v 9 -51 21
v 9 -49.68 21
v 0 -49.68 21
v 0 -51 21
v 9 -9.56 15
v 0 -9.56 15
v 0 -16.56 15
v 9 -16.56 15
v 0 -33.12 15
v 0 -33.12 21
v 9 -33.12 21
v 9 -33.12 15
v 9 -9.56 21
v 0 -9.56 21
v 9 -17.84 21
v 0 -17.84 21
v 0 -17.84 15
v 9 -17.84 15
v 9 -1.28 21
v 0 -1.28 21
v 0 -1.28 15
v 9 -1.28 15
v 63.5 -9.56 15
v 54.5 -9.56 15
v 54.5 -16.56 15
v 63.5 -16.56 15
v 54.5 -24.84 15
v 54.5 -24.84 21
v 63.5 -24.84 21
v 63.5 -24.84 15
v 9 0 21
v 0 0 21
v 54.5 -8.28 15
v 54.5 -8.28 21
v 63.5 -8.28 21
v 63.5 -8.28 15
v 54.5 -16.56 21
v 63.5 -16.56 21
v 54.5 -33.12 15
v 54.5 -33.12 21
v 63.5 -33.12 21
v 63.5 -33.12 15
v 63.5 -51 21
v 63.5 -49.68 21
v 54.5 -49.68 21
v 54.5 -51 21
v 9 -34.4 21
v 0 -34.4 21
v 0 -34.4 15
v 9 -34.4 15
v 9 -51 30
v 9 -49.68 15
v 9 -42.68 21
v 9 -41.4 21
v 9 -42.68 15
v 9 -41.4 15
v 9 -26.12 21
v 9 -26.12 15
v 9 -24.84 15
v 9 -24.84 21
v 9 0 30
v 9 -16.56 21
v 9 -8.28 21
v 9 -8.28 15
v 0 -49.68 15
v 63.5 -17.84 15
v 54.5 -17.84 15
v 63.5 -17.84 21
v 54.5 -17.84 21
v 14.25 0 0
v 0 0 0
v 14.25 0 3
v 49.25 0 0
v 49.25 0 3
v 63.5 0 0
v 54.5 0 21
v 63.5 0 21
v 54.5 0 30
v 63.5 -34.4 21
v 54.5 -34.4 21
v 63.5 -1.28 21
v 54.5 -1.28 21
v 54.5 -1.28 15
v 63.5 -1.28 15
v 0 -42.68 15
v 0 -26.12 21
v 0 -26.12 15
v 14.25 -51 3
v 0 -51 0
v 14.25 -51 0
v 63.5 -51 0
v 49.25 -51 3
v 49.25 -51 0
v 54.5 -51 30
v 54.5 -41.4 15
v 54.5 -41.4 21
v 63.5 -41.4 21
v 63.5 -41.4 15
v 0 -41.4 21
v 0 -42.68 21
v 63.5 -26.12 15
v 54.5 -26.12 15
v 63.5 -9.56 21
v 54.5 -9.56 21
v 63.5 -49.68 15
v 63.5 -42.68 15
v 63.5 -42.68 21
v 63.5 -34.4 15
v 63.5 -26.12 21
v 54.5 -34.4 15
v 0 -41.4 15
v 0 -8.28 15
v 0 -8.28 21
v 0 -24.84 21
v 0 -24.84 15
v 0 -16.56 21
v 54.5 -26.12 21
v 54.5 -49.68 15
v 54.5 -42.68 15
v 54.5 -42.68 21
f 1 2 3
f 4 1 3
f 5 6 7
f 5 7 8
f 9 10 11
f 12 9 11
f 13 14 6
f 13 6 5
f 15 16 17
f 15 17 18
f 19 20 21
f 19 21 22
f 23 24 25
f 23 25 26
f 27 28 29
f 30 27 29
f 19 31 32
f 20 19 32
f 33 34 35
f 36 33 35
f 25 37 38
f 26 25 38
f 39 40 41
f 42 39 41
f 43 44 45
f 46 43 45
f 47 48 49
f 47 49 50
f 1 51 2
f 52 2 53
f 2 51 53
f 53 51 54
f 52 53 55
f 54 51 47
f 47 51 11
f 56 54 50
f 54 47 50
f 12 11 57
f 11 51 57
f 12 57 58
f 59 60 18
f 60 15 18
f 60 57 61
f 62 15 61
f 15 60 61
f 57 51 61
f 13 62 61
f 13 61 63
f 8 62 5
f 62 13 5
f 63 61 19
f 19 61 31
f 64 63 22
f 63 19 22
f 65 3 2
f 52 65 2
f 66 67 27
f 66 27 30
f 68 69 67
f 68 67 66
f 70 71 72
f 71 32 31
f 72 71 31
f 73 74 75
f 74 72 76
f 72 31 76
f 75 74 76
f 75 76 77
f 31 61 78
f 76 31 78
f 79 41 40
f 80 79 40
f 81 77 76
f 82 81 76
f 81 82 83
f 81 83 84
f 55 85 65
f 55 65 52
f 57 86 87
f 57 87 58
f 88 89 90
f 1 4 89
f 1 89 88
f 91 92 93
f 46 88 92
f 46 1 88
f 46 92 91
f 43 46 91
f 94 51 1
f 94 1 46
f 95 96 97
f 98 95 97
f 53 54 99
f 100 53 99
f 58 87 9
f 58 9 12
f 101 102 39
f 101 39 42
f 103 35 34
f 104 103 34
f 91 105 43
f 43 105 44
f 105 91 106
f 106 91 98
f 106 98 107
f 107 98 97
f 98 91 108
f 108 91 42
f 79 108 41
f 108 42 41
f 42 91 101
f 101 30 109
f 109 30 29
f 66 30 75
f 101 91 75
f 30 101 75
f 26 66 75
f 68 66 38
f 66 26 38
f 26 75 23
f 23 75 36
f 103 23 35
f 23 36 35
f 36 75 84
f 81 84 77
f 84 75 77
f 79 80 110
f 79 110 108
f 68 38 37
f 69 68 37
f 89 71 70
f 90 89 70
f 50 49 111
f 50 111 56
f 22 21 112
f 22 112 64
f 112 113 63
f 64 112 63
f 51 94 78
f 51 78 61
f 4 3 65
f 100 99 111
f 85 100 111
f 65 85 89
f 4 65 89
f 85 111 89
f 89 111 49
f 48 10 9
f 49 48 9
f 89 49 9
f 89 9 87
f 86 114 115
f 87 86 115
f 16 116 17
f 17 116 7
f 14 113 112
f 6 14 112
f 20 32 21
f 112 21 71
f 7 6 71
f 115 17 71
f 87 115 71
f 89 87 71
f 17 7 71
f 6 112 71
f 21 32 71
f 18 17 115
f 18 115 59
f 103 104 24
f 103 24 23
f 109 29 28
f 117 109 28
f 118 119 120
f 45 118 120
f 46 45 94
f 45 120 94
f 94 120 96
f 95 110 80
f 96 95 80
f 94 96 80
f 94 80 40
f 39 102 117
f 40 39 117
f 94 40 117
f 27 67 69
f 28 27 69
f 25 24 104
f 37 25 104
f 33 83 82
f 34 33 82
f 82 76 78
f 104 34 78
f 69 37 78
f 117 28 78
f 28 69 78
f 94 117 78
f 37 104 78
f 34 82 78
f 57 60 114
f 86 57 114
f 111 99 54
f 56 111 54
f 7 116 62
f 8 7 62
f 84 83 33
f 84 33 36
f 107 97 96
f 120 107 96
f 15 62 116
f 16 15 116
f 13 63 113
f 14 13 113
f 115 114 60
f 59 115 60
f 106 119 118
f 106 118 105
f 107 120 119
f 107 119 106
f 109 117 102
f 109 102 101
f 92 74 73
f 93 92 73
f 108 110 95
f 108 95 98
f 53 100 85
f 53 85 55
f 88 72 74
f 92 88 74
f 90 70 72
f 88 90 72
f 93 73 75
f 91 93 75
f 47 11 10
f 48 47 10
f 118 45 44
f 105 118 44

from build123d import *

# Parameters (mm, degrees)
F1_DEPTH = 51
F2_W     = 9
F2_H     = 7
F3_DEPTH = 6


with BuildPart() as f1:
    # F0 (on Front) → F1 (new body)
    with BuildSketch(Plane.XZ):
        Polygon((0, 21), (0, 0), (14.25, 0), (14.25, 3), (49.25, 3), (49.25, 0), (63.5, 0), (63.5, 21), (54.5, 21), (54.5, 30), (9, 30), (9, 21), align=None)
    extrude(amount=F1_DEPTH)

    # F2 (on face) → F3 (cut)
    with BuildSketch(Plane.XY.offset(21)):
        with Locations((59, -4.78)):
            Rectangle(F2_W, F2_H)
        with Locations((59, -13.06)):
            Rectangle(F2_W, F2_H)
        with Locations((59, -21.34)):
            Rectangle(F2_W, F2_H)
        with Locations((59, -29.62)):
            Rectangle(F2_W, F2_H)
        with Locations((59, -37.9)):
            Rectangle(F2_W, F2_H)
        with Locations((59, -46.18)):
            Rectangle(F2_W, F2_H)
        with Locations((4.5, -4.78)):
            Rectangle(F2_W, F2_H)
        with Locations((4.5, -13.06)):
            Rectangle(F2_W, F2_H)
        with Locations((4.5, -21.34)):
            Rectangle(F2_W, F2_H)
        with Locations((4.5, -29.62)):
            Rectangle(F2_W, F2_H)
        with Locations((4.5, -37.9)):
            Rectangle(F2_W, F2_H)
        with Locations((4.5, -46.18)):
            Rectangle(F2_W, F2_H)
    extrude(amount=-F3_DEPTH, mode=Mode.SUBTRACT)


solid = f1.part
